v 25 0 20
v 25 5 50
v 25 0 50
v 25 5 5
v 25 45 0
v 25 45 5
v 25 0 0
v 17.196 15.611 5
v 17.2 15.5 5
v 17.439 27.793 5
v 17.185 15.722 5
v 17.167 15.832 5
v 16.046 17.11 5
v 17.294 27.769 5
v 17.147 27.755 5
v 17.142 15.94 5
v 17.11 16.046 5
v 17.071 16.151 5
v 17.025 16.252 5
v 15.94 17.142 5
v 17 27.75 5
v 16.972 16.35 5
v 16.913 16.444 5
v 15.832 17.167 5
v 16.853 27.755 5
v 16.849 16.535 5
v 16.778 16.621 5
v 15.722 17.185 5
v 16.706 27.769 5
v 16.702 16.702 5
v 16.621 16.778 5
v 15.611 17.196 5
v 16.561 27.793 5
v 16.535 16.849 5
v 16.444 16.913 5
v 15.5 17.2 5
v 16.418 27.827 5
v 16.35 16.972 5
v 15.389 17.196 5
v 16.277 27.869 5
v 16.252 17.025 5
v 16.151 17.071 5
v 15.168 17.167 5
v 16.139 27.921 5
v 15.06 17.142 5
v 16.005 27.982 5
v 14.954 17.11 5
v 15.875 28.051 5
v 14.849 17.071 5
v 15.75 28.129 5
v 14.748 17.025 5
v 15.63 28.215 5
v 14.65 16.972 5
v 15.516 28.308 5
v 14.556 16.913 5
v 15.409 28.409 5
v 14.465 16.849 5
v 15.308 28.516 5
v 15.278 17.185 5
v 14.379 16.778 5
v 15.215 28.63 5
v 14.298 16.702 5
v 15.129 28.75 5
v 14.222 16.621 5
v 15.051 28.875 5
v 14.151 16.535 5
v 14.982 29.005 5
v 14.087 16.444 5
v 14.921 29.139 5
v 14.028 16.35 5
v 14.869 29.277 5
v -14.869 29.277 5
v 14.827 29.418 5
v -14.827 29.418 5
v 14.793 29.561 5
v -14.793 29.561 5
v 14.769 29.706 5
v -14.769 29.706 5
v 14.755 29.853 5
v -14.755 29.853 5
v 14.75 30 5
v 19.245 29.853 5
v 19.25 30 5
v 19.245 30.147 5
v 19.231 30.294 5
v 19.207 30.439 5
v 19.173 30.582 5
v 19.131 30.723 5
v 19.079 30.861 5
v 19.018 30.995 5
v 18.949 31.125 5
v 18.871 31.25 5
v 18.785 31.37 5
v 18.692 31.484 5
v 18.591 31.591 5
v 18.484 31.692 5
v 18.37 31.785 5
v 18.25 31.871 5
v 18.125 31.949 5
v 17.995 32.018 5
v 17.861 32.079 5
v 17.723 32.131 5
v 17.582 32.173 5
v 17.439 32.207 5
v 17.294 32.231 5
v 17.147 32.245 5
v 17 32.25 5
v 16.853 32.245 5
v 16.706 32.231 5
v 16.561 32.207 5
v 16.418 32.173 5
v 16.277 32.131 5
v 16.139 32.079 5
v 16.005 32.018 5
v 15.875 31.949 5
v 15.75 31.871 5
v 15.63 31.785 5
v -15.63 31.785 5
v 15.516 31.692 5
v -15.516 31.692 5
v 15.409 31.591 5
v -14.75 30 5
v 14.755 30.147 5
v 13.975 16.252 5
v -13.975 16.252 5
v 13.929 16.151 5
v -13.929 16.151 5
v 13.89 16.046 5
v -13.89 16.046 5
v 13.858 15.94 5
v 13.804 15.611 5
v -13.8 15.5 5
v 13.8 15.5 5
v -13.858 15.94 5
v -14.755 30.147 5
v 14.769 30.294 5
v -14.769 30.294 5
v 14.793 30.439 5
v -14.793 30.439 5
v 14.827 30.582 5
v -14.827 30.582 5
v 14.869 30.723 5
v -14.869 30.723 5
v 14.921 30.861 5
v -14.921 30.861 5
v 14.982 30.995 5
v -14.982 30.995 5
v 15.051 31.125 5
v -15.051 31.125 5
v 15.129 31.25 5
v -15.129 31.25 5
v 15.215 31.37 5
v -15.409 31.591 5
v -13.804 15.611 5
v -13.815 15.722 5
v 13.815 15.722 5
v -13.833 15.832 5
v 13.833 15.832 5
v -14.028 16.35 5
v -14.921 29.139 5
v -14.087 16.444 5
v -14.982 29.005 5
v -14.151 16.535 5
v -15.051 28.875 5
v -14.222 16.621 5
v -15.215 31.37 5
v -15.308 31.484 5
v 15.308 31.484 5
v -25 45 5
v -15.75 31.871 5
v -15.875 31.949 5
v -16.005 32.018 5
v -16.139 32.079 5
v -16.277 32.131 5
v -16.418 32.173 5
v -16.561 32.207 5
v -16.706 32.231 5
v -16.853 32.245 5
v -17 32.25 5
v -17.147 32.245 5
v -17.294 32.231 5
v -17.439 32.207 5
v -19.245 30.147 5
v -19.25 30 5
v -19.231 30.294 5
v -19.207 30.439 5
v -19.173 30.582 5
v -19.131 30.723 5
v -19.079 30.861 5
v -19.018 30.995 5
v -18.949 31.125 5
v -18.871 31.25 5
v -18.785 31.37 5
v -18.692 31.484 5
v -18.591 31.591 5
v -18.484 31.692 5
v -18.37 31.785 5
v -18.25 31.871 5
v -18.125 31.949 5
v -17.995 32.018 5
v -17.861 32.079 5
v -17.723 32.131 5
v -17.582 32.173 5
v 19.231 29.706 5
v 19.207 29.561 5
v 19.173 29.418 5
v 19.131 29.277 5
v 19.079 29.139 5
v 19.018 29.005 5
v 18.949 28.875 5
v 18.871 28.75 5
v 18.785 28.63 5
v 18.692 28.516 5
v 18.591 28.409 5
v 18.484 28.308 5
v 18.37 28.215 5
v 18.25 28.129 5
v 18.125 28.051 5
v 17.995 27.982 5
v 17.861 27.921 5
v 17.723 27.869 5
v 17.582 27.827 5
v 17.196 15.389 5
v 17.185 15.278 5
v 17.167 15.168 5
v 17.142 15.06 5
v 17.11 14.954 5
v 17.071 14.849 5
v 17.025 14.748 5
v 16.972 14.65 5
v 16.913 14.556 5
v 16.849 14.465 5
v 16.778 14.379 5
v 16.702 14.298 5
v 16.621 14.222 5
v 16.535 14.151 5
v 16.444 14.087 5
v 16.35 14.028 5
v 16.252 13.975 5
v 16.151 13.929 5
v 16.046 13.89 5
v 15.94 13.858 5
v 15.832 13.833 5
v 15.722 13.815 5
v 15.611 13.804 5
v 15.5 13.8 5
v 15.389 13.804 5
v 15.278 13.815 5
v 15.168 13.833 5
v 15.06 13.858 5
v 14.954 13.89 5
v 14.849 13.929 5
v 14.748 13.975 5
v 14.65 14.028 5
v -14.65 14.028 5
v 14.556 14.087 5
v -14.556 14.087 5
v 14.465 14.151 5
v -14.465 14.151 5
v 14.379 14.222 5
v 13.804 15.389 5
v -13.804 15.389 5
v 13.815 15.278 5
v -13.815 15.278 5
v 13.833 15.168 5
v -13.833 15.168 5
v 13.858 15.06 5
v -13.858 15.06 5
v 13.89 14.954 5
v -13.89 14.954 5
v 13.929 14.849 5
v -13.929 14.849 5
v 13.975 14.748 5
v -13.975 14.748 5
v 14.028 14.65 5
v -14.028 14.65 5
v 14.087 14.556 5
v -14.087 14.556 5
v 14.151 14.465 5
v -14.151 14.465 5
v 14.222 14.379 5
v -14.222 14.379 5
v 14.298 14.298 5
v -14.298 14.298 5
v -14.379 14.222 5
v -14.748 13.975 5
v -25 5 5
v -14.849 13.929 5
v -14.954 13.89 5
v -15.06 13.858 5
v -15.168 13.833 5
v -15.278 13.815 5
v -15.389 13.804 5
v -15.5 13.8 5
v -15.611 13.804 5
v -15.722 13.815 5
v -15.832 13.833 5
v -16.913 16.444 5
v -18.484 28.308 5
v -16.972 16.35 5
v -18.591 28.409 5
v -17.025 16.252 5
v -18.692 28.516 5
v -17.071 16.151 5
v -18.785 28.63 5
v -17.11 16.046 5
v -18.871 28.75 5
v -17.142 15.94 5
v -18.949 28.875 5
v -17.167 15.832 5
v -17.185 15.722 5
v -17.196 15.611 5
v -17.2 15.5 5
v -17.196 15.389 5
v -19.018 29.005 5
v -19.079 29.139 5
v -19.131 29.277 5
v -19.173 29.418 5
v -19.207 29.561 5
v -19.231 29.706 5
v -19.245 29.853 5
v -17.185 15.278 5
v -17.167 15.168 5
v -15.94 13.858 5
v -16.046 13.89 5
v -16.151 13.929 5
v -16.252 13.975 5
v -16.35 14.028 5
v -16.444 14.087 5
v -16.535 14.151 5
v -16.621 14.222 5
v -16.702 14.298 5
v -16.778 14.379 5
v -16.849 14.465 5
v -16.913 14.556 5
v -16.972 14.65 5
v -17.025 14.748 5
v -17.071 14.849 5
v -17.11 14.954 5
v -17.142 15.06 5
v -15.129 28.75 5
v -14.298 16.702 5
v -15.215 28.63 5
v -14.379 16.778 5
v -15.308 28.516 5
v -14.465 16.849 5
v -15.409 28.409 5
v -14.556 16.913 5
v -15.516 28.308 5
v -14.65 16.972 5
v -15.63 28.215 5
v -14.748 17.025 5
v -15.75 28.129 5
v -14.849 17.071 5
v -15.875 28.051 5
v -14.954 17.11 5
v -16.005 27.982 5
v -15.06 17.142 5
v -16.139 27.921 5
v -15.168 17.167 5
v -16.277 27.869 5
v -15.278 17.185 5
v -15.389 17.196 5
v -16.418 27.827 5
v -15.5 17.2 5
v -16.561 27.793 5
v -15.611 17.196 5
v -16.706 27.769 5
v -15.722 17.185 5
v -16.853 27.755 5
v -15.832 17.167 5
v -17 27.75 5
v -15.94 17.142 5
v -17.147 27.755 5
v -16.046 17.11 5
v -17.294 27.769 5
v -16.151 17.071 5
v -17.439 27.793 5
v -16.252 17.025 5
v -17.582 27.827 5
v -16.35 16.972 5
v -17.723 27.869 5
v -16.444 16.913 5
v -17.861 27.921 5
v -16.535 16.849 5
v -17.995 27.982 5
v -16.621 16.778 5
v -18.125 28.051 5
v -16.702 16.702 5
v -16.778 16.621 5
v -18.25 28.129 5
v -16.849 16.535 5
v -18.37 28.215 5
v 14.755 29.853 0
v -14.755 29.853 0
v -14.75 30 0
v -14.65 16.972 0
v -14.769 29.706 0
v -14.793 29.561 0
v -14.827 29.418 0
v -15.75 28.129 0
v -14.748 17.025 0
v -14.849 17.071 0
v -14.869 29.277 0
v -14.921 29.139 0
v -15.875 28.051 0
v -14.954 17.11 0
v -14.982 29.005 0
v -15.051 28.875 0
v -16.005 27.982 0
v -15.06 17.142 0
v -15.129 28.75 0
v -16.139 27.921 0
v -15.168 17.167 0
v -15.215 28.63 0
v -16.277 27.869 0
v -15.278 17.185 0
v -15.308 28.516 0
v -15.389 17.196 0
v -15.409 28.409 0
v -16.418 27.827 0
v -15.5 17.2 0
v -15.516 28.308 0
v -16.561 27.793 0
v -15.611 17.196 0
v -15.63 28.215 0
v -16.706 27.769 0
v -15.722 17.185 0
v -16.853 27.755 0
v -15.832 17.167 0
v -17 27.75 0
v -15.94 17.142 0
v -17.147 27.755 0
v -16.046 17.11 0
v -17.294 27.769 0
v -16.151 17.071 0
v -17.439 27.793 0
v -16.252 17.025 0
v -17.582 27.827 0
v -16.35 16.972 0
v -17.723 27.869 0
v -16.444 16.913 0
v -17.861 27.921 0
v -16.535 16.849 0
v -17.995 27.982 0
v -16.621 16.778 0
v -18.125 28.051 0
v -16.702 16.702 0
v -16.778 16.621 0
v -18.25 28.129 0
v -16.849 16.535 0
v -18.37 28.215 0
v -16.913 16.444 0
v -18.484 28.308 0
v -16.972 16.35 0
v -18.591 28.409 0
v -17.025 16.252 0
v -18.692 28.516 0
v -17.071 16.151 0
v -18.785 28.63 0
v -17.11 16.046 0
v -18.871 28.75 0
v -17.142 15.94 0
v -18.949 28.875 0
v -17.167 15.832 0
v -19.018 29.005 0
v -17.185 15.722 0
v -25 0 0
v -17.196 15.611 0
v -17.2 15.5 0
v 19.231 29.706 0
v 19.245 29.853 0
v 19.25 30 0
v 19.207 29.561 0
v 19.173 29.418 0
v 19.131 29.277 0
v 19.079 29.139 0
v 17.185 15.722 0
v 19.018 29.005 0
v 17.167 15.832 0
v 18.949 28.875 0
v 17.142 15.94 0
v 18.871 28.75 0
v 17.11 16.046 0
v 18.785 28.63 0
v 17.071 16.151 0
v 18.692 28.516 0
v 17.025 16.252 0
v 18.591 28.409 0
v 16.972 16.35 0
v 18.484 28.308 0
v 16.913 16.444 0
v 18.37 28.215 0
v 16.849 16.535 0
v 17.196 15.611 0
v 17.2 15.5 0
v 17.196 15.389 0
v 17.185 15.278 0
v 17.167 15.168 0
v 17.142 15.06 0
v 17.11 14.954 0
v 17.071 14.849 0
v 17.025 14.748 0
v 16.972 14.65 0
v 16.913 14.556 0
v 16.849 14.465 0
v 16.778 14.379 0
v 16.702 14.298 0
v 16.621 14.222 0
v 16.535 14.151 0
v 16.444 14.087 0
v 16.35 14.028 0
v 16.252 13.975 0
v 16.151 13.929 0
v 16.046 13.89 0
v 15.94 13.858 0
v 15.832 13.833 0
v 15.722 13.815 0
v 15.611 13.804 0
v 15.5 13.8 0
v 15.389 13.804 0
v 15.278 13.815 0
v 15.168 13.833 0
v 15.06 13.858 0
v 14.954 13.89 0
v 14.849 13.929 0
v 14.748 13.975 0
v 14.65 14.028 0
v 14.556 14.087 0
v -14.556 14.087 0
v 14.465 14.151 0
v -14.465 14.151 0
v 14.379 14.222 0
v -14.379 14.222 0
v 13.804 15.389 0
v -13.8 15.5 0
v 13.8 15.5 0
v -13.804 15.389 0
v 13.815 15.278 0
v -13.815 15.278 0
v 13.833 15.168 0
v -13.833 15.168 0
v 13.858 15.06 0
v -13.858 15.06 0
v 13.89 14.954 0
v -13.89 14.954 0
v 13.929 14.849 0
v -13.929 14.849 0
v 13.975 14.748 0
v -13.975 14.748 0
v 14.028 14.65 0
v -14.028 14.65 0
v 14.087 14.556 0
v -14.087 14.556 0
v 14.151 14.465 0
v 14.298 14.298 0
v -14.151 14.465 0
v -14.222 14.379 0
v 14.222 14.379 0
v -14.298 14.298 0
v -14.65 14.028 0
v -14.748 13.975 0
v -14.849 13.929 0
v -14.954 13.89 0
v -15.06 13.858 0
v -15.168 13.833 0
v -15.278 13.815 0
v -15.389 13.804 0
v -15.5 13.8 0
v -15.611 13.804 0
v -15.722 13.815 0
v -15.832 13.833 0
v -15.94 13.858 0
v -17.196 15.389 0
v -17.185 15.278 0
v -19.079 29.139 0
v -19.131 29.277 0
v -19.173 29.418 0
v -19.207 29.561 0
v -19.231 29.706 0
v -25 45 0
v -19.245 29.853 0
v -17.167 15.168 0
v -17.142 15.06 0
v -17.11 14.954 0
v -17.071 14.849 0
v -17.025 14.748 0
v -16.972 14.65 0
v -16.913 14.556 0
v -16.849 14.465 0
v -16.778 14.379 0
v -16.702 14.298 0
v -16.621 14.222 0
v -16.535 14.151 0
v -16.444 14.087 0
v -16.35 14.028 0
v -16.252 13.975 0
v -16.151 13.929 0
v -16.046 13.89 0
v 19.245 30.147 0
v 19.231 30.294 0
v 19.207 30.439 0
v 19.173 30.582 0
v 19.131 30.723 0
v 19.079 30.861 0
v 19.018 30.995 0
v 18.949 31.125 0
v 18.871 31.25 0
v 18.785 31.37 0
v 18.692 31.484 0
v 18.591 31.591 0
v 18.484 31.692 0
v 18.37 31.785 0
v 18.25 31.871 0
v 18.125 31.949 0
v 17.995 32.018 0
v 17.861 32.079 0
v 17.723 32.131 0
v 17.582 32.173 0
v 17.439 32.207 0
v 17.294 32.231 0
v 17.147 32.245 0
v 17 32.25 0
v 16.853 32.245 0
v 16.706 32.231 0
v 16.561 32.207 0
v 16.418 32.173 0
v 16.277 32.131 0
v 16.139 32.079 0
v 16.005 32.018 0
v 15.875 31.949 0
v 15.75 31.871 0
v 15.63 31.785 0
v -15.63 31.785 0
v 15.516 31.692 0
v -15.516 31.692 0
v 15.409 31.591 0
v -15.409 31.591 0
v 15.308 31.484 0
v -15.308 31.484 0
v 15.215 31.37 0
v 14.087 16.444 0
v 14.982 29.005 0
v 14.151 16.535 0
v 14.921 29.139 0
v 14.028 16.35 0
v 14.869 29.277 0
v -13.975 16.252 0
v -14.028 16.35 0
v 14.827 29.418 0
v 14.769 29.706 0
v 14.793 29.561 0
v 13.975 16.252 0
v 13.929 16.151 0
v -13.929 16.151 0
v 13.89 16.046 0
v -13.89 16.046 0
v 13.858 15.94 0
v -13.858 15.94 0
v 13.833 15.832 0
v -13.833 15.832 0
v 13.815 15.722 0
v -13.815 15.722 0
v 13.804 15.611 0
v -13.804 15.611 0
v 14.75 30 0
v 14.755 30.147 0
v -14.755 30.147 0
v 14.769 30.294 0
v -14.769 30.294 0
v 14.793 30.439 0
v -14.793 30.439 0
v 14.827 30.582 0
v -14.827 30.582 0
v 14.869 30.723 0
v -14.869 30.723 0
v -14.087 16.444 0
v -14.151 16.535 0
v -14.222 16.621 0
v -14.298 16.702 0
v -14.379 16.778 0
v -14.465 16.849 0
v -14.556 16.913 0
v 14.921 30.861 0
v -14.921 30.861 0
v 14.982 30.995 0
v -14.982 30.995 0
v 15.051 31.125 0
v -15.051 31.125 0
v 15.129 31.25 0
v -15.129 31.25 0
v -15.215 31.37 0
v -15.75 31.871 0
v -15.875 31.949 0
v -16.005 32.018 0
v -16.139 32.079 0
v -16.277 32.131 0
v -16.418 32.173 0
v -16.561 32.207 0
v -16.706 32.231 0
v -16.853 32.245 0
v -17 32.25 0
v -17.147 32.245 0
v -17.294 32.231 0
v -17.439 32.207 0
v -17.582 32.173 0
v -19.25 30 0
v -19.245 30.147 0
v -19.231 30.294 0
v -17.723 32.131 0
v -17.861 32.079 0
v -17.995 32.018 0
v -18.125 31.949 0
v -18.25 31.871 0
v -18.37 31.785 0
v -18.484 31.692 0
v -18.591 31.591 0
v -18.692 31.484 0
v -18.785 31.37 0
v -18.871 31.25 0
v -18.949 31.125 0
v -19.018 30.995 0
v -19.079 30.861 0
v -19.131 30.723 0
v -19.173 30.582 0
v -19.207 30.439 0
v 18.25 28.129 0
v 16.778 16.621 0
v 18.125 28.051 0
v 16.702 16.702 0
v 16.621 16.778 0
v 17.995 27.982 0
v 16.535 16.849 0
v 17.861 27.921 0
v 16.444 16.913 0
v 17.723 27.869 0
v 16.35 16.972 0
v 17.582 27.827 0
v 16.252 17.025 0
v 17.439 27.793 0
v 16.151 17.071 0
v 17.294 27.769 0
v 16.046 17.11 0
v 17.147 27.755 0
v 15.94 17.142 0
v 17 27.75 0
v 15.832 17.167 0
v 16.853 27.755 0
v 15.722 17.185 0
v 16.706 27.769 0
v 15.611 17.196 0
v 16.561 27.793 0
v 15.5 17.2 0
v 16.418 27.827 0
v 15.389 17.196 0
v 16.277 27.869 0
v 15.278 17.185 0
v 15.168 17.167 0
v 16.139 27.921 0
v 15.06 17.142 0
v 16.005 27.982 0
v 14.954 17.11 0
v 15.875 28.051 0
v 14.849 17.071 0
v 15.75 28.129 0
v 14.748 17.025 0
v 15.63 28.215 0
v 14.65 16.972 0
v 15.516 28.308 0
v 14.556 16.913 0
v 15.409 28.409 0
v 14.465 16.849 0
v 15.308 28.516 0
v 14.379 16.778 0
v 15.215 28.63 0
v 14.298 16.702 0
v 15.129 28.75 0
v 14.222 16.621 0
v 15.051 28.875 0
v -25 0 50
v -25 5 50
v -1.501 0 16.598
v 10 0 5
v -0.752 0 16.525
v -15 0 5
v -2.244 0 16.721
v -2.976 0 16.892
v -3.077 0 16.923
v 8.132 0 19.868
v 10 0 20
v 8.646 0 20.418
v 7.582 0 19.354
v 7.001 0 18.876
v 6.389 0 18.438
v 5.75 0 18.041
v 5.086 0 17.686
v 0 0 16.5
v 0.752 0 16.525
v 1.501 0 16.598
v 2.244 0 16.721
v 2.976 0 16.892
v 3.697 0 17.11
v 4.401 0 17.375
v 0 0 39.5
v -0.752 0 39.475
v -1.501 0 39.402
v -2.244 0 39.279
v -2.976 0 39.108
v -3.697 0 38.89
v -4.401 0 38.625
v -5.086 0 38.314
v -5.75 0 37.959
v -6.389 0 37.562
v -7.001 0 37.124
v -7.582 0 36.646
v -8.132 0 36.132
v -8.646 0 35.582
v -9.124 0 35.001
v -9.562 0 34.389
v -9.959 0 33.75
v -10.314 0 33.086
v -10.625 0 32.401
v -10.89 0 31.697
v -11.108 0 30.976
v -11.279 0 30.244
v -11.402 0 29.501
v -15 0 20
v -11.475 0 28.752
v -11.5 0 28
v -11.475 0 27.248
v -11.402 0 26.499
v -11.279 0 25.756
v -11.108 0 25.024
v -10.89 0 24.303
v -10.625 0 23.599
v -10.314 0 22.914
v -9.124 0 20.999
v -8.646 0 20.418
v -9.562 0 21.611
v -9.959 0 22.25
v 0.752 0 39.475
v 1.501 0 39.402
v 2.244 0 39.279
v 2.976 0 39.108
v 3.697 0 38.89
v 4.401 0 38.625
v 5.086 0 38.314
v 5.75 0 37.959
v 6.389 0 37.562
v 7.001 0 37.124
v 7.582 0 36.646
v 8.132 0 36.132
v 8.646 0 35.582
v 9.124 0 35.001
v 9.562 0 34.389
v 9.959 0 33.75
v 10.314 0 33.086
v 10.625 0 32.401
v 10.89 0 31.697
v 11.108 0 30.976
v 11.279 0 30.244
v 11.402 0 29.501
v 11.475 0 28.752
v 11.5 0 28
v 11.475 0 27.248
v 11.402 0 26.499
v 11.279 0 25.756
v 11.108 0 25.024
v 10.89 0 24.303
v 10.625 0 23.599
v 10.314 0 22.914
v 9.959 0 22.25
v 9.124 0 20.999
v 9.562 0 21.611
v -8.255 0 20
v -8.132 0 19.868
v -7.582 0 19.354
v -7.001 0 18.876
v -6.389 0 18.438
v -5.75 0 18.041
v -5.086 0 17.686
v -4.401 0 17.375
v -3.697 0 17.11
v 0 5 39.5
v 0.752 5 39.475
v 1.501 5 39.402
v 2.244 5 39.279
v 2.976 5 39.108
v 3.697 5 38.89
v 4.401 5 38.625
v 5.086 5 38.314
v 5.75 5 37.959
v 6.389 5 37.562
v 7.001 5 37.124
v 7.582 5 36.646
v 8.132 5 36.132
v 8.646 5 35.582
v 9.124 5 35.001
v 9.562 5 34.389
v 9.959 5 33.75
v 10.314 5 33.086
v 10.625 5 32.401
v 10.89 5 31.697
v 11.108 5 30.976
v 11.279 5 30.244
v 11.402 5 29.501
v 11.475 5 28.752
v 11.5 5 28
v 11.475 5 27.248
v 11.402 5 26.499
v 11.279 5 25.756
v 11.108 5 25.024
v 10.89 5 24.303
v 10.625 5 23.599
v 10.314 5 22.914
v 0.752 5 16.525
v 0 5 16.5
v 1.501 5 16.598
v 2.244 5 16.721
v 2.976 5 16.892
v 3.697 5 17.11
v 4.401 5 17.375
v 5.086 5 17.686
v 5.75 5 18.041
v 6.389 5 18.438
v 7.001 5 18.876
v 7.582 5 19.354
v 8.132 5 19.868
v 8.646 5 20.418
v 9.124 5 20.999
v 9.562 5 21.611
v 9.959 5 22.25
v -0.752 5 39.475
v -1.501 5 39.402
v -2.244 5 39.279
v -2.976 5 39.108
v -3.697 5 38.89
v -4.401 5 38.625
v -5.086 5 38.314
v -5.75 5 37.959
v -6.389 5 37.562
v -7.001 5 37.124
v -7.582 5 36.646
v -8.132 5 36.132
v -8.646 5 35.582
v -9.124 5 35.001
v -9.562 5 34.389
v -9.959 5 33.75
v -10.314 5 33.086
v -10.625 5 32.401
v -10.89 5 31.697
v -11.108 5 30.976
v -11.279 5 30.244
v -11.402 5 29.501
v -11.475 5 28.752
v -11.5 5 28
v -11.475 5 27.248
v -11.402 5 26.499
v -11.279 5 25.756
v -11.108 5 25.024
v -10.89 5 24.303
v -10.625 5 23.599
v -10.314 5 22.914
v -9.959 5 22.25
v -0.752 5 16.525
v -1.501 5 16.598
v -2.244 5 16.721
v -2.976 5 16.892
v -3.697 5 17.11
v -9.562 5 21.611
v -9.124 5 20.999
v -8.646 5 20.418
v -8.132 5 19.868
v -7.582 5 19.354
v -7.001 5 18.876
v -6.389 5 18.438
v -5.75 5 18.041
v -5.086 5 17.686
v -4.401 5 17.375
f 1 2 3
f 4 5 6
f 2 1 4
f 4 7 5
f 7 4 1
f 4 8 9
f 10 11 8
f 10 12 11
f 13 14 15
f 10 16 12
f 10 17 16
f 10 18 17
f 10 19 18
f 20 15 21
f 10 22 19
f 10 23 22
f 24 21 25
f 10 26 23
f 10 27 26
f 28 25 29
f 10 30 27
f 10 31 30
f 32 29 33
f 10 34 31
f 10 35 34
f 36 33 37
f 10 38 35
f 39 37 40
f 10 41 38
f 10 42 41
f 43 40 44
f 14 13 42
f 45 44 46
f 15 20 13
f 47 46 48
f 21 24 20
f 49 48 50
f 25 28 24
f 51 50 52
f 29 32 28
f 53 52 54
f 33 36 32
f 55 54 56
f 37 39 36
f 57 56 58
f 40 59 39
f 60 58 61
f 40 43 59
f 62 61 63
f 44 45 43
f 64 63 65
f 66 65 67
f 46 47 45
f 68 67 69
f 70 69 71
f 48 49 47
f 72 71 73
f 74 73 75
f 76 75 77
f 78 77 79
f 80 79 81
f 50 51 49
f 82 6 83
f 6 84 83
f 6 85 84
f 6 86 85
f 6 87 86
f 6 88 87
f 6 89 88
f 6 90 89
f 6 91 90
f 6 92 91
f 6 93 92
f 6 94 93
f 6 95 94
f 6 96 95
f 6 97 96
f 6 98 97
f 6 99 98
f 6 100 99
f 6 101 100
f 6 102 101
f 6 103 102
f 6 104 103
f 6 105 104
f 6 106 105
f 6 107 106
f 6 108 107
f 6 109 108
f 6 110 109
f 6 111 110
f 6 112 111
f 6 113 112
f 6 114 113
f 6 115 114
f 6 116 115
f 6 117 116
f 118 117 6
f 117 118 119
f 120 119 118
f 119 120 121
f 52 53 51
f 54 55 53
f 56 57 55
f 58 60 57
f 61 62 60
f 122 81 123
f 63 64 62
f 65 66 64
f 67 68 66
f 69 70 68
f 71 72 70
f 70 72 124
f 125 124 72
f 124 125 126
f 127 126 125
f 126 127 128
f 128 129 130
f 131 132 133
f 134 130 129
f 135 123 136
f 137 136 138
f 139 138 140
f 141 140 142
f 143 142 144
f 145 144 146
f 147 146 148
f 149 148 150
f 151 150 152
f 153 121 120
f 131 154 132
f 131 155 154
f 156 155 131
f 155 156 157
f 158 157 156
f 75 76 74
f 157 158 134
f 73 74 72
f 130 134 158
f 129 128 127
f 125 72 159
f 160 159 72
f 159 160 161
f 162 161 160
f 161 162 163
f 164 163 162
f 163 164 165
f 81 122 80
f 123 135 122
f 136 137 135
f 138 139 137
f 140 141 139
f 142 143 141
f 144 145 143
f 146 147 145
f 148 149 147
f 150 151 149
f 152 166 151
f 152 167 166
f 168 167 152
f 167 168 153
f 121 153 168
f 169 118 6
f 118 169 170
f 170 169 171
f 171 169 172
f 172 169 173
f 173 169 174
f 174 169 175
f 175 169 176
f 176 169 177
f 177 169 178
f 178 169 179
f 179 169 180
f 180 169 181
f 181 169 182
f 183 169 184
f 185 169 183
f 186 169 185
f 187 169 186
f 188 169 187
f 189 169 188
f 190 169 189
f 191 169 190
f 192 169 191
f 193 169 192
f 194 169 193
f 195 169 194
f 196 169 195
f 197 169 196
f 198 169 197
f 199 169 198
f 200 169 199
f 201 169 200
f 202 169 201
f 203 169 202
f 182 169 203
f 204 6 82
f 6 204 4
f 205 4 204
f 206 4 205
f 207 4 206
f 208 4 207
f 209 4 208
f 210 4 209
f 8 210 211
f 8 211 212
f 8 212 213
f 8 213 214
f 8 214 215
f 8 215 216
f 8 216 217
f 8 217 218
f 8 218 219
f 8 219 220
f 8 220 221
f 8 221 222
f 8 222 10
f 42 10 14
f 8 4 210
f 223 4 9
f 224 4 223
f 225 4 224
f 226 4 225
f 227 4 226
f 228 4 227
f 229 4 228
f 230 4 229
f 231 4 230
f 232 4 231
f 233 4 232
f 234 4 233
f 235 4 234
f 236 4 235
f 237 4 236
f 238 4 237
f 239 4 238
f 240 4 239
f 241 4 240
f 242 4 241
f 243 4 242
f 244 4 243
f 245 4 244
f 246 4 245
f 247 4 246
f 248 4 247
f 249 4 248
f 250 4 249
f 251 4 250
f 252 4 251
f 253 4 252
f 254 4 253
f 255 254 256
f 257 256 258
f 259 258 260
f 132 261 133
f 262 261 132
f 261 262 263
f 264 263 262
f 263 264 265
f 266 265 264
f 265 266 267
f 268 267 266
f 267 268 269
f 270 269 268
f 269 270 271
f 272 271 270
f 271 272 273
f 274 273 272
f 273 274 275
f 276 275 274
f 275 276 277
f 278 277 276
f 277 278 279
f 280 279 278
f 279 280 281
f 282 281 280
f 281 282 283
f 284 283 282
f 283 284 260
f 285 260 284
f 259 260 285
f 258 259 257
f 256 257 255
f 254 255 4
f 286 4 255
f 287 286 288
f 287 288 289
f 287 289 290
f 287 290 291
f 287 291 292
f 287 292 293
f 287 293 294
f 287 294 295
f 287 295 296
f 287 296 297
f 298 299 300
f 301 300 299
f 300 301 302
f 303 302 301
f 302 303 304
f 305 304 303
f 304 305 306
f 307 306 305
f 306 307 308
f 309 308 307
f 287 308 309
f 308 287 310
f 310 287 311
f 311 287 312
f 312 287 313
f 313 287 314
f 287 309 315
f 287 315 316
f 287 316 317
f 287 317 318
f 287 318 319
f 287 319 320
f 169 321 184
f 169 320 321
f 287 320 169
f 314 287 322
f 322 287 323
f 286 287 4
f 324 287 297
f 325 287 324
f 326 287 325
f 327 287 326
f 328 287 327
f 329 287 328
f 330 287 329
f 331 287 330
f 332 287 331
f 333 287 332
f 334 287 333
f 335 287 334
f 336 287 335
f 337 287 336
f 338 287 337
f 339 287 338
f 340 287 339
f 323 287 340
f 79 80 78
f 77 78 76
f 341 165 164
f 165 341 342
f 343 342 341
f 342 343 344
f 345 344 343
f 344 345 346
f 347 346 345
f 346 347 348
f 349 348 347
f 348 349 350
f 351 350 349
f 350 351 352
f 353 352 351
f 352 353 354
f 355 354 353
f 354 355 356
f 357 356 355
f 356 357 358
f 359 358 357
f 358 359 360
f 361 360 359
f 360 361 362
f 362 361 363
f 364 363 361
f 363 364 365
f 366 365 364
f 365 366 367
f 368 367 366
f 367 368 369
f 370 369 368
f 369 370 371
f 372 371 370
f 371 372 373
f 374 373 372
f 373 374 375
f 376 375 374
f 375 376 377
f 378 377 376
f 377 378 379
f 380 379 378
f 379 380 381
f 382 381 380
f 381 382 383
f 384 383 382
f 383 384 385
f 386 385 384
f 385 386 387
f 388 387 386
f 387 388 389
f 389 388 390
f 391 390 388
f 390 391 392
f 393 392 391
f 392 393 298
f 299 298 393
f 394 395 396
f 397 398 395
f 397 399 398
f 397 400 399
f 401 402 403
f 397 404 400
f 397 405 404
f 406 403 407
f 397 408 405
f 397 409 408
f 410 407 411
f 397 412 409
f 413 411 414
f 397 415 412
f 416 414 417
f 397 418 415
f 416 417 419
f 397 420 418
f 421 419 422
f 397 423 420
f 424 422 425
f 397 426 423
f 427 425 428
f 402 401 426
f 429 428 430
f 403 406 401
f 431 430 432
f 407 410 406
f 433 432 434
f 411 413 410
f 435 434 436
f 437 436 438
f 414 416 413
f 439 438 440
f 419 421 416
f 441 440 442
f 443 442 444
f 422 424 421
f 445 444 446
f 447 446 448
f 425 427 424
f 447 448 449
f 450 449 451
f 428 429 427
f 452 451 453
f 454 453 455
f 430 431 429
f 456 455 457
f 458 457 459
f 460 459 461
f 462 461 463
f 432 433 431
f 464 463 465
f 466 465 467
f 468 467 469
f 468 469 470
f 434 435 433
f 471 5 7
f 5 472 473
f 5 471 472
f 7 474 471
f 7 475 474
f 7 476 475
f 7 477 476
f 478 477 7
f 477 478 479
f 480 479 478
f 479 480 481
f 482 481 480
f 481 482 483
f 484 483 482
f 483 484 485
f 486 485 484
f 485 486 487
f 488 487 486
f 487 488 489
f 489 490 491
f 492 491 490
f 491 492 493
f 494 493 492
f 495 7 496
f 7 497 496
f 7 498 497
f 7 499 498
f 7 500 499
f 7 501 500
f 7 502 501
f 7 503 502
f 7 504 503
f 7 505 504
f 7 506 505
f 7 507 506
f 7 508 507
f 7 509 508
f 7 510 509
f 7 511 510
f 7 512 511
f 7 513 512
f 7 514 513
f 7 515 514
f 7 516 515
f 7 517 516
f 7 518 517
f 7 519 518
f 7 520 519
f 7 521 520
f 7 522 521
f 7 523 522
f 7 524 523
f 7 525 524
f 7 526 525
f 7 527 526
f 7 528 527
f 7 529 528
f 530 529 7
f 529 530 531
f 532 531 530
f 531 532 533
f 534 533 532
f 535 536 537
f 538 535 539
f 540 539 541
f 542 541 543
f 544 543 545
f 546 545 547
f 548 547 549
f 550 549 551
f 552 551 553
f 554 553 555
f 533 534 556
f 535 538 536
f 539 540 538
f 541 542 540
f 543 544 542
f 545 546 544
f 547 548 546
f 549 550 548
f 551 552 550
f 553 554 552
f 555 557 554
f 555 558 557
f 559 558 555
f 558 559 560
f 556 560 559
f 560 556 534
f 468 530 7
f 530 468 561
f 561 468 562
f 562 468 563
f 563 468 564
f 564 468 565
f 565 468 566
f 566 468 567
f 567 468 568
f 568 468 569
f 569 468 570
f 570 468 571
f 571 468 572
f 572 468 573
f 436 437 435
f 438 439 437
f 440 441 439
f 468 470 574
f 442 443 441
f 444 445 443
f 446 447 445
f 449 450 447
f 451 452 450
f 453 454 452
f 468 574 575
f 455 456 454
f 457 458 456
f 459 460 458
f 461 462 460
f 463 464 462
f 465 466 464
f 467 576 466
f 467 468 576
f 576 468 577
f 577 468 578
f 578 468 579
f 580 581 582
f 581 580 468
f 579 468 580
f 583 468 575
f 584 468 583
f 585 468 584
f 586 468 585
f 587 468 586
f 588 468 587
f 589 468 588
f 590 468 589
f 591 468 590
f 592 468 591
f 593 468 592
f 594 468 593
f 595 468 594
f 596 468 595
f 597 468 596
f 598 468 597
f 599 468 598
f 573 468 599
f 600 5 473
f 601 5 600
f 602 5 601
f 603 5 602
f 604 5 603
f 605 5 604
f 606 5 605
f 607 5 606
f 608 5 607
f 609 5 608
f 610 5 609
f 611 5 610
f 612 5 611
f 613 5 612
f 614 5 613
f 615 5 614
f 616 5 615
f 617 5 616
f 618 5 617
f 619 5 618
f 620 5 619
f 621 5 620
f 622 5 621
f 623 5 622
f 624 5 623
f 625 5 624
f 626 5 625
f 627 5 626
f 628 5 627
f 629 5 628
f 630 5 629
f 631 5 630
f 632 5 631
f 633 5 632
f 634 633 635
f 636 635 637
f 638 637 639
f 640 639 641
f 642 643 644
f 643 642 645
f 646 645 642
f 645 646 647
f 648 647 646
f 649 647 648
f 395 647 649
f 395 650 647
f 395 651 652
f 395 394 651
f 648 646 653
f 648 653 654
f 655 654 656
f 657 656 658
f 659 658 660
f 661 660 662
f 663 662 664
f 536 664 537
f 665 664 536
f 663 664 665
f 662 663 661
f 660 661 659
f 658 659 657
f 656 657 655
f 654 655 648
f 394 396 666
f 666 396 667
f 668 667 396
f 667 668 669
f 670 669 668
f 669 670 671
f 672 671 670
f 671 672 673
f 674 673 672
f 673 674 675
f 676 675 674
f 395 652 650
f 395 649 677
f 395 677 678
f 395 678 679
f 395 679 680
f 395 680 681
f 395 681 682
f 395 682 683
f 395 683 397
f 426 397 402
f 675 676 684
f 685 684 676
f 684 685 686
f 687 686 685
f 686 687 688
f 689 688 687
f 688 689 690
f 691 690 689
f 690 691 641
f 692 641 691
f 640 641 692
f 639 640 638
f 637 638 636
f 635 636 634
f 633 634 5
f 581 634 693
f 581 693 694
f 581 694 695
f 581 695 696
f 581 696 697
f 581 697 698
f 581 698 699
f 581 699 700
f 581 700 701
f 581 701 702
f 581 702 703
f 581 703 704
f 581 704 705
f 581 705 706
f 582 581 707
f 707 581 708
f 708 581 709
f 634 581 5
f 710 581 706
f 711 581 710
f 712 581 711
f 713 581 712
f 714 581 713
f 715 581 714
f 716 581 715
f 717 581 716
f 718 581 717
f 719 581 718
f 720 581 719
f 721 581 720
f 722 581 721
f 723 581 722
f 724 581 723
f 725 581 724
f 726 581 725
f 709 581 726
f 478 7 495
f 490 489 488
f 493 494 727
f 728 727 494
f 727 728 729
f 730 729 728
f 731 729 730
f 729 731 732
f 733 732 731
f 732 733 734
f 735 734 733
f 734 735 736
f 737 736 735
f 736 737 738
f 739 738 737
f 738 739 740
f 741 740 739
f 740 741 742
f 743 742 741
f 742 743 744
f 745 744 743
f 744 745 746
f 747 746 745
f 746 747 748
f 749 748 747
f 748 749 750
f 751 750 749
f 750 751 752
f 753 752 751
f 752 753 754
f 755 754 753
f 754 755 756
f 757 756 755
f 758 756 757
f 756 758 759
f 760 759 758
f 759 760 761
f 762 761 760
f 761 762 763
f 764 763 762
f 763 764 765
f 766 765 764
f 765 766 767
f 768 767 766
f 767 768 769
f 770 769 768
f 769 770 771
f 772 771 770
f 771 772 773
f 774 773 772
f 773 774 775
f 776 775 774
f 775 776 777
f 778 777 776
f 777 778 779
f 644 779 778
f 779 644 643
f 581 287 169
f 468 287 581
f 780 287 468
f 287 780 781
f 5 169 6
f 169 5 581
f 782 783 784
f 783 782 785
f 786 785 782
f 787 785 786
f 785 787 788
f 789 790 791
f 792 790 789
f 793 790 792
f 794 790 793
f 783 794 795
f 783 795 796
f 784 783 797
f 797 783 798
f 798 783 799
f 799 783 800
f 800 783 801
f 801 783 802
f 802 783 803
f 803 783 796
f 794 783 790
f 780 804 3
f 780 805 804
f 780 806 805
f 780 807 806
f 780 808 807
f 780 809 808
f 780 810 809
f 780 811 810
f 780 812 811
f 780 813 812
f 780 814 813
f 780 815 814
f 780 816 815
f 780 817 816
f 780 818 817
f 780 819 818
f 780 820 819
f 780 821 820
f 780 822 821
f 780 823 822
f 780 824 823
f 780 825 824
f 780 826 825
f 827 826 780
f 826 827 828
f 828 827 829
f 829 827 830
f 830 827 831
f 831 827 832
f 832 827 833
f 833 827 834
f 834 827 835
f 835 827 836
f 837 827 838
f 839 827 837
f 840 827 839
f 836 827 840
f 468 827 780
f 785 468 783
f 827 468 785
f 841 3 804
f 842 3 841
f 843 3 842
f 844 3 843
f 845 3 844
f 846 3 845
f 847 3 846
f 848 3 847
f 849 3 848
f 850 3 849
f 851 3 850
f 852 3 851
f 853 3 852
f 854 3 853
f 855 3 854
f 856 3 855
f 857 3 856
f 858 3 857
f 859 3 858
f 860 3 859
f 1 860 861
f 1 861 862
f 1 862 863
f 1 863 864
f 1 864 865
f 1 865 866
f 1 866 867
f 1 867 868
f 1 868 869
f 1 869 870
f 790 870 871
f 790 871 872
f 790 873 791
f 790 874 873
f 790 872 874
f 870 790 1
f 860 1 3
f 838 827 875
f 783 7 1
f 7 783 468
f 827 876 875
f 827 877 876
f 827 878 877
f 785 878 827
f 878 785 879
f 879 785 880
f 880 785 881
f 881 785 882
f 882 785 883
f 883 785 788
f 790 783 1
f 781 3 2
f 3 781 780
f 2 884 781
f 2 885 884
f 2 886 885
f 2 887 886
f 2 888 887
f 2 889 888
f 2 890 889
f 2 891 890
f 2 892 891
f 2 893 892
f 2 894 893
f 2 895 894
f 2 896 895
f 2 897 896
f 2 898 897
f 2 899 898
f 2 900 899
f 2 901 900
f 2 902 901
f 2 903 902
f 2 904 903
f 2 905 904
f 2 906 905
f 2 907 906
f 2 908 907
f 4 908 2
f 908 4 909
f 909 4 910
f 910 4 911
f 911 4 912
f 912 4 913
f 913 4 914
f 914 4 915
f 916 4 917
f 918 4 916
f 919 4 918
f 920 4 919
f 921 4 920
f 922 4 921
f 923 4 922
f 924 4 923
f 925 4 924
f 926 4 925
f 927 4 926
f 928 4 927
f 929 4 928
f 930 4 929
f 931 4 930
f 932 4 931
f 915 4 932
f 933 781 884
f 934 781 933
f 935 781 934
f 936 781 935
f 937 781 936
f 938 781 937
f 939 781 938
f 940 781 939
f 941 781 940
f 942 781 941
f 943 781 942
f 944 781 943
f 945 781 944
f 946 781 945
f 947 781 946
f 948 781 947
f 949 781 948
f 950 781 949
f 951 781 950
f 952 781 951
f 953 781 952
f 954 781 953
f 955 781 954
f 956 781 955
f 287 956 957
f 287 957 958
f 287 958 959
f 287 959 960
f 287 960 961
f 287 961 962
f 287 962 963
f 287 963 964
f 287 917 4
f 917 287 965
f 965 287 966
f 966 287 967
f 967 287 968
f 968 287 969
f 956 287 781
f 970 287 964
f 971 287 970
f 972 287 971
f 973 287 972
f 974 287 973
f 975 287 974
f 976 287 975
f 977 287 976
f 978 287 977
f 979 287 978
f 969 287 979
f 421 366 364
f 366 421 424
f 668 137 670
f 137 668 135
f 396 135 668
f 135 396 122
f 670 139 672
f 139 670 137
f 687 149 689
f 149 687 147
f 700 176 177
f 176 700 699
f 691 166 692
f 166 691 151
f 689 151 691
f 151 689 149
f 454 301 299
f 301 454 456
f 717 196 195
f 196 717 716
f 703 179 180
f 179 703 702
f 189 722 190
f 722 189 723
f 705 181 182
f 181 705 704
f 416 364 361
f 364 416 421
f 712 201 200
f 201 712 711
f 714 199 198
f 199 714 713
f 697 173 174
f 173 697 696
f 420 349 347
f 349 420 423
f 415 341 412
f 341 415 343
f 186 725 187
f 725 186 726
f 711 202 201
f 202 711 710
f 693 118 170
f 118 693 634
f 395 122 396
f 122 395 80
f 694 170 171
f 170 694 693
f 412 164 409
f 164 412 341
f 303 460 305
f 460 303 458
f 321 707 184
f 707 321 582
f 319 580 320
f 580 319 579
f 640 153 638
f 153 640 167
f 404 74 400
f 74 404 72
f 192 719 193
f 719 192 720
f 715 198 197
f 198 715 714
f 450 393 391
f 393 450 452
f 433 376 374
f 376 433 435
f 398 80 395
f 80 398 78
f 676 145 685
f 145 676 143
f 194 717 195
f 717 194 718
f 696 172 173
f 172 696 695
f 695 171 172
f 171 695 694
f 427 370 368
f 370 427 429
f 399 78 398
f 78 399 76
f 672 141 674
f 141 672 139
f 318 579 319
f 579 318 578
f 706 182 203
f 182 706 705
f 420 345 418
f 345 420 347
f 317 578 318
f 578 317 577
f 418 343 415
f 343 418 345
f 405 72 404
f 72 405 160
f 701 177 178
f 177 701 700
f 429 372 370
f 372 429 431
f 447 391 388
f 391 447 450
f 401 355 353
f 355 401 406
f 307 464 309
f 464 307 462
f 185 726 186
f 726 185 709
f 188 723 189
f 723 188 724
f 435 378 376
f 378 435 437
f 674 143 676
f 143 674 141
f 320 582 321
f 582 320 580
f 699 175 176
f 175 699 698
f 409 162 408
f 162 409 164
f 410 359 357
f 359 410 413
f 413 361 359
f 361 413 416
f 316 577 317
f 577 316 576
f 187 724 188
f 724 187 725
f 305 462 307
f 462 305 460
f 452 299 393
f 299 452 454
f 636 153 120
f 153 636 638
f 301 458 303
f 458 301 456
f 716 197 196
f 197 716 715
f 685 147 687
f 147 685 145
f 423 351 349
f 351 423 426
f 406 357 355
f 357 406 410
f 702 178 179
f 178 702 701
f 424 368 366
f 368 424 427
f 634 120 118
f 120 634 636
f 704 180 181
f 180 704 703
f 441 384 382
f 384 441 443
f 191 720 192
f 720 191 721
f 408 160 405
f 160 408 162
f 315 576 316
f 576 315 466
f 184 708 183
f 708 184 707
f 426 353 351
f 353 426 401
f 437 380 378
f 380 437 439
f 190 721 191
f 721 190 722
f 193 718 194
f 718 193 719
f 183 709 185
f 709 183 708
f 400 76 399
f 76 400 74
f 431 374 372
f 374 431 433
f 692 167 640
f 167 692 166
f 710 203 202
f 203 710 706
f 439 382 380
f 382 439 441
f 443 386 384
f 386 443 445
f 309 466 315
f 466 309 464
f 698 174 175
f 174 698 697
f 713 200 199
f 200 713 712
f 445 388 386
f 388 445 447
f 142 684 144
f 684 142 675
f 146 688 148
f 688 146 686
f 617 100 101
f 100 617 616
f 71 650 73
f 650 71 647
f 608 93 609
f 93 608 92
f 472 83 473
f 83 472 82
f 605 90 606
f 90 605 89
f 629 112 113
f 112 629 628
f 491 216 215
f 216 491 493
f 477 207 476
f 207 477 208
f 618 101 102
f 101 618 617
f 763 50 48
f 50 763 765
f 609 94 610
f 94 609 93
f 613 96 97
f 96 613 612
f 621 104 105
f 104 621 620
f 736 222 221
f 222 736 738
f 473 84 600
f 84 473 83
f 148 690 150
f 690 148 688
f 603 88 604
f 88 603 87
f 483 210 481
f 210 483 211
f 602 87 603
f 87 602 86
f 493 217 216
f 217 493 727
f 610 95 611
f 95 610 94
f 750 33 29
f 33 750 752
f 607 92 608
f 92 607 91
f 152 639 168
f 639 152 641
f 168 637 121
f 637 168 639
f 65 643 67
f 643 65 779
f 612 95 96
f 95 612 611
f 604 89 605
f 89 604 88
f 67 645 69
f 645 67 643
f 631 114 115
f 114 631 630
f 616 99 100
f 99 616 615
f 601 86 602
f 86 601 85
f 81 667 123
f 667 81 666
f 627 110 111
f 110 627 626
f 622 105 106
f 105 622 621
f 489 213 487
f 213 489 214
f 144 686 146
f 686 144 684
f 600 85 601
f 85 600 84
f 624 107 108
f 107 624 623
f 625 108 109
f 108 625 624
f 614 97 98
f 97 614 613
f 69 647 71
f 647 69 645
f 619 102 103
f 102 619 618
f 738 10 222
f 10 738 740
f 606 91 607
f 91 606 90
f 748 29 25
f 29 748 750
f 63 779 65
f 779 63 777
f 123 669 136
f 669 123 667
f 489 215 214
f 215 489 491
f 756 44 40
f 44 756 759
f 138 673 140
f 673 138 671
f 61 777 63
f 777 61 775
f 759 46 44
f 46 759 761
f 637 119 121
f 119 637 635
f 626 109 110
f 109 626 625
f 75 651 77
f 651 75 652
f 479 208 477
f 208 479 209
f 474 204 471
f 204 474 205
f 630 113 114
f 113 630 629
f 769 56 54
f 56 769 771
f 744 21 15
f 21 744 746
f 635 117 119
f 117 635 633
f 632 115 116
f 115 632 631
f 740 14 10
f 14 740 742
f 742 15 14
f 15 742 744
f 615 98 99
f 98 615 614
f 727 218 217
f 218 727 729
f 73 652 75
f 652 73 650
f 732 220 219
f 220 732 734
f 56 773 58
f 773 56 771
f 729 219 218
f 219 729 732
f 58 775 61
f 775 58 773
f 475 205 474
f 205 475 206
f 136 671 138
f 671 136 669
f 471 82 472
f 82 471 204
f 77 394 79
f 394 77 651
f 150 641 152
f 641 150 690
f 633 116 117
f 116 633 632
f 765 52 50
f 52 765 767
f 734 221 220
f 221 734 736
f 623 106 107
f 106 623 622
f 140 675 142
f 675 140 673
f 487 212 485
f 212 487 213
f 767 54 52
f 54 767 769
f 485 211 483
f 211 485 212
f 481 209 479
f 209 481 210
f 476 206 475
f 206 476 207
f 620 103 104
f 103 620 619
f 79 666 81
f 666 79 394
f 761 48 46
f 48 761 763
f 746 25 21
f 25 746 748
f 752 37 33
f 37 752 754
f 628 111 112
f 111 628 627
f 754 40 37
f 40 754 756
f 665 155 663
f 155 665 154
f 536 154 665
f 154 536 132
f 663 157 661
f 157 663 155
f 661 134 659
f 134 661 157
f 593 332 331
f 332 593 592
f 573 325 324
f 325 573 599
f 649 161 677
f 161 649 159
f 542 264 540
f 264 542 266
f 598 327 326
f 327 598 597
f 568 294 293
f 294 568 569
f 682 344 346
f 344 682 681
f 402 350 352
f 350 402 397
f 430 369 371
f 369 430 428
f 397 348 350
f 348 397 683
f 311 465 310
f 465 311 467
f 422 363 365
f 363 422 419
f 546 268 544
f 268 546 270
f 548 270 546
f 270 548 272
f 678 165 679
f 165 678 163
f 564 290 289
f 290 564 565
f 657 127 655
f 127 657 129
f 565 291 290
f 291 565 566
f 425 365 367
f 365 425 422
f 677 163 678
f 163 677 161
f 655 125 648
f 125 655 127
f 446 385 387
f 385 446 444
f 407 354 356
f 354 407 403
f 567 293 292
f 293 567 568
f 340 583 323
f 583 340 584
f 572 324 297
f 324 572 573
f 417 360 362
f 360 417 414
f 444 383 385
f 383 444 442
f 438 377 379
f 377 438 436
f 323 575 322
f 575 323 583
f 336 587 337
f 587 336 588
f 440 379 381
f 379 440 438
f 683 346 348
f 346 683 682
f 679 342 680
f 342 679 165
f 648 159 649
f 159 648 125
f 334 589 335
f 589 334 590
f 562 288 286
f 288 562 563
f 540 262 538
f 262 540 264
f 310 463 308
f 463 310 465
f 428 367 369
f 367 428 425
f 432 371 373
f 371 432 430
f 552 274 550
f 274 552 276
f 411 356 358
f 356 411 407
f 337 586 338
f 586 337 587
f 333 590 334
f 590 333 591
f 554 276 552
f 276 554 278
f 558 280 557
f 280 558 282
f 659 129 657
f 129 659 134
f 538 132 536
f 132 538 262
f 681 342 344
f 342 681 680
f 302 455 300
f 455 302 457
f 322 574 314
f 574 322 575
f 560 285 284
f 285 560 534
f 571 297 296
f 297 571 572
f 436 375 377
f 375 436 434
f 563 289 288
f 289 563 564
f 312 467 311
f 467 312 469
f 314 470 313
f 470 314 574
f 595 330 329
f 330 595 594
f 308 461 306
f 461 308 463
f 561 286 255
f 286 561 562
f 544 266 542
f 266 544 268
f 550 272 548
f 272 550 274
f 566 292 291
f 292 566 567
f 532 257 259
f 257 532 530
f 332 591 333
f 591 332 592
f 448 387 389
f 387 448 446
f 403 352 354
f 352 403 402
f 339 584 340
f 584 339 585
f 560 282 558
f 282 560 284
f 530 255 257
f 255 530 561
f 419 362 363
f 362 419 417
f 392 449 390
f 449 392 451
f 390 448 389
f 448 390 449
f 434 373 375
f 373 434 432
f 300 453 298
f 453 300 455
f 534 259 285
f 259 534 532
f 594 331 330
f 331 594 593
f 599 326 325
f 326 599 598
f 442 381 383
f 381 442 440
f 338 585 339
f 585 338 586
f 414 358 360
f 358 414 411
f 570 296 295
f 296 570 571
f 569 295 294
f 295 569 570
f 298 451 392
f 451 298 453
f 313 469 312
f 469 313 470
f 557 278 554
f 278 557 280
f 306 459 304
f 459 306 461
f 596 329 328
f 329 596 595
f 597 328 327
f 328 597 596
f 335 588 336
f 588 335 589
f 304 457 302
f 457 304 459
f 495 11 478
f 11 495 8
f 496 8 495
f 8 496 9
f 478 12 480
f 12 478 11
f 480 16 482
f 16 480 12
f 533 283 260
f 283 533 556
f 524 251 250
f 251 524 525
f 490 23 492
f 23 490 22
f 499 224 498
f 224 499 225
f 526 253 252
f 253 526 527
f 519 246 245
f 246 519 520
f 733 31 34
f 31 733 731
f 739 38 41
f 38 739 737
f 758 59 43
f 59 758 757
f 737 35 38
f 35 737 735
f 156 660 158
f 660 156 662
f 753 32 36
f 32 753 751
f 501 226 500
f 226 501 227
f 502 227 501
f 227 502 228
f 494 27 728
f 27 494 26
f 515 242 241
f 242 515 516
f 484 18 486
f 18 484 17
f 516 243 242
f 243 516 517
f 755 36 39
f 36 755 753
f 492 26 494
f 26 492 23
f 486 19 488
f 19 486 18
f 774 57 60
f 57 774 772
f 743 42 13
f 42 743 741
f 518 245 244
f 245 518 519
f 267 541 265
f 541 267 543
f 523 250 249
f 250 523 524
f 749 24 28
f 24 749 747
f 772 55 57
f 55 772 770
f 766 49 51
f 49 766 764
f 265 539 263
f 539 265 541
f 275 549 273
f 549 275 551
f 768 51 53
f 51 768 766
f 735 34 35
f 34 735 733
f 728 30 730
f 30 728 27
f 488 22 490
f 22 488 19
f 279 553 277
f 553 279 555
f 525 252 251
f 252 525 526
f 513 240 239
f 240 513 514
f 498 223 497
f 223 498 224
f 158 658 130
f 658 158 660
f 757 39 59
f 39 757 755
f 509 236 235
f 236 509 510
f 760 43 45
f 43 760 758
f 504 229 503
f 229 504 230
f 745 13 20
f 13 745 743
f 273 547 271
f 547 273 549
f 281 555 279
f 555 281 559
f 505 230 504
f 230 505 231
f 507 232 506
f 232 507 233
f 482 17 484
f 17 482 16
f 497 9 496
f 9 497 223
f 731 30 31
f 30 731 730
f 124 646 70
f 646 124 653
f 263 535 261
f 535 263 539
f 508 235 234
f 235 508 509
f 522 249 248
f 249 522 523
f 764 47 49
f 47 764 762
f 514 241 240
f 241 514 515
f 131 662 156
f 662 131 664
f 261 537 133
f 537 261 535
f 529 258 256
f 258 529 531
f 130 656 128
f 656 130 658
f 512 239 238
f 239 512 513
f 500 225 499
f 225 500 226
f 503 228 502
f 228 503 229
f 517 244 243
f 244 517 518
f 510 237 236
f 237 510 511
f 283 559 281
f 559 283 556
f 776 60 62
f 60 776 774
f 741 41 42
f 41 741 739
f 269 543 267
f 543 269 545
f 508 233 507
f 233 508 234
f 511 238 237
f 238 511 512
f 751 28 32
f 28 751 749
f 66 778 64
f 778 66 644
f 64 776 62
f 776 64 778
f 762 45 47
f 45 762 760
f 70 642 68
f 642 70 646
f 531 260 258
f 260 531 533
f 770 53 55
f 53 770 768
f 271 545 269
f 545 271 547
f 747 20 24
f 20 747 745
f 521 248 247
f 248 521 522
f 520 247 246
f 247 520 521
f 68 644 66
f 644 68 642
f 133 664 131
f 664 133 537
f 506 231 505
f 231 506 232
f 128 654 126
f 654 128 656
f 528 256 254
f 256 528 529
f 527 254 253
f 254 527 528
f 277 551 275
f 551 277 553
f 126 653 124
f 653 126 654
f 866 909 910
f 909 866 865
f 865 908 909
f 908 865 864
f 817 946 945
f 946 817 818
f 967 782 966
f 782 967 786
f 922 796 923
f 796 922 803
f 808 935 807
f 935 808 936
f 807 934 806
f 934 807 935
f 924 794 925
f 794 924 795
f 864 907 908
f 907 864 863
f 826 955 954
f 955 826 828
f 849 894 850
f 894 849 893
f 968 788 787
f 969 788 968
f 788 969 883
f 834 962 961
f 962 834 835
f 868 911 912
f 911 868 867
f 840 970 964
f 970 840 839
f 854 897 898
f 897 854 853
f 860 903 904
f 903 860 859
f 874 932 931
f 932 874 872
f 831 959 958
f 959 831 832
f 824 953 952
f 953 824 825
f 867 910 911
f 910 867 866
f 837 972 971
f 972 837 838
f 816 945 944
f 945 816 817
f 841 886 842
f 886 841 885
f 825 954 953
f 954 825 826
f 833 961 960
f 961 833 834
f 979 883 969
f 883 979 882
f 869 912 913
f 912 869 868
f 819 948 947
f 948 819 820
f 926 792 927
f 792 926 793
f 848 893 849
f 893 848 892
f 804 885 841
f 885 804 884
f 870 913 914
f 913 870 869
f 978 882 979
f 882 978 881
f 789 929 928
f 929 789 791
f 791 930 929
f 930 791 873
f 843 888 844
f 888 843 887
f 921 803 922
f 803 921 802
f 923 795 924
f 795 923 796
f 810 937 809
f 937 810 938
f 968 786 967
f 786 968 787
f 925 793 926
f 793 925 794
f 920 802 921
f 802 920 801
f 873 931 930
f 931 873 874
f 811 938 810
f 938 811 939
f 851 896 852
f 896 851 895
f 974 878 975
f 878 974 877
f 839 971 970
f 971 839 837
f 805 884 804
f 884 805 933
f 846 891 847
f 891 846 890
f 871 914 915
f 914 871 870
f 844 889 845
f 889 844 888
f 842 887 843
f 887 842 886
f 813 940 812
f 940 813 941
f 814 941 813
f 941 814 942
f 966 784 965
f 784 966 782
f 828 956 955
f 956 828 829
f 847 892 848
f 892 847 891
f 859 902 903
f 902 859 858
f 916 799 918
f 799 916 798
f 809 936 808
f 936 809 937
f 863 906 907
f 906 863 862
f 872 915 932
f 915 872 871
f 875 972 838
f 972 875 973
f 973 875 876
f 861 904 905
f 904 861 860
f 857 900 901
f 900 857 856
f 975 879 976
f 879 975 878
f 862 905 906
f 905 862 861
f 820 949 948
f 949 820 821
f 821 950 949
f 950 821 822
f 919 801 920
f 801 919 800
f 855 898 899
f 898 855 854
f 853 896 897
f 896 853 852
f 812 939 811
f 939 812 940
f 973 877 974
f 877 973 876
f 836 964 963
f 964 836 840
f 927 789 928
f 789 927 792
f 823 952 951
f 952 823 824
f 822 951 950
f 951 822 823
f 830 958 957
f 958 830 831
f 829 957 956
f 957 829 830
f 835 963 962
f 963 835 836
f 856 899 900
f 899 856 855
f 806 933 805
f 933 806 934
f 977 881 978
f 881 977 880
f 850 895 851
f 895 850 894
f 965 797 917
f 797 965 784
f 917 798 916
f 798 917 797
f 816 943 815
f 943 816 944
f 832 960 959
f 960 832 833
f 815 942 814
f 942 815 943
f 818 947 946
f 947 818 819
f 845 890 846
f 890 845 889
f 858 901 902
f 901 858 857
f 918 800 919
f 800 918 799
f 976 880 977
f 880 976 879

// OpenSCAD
// L-shaped mounting bracket for a NEMA 17 stepper motor
// Print orientation: base plate on the bed (z = 0), vertical plate builds upward.

// ---------------- Parameters ----------------
plate_x       = 25;    // base plate half-length in X (mm)
plate_y       = 45;    // base plate length in Y (mm)
plate_t       = 5;     // base plate thickness (mm)

motor_h       = 50;    // vertical motor plate height (mm)
motor_w       = 25;    // vertical motor plate half-width in X (mm)

boss_d        = 23;    // diameter of the motor centring-boss hole (mm)
boss_x        = 0;     // boss hole centre X (mm)
boss_z        = 28;    // boss hole centre Z (mm)

screw_d       = 3.4;   // M3 screw hole diameter (mm)
screw_pattern = 31;    // square pitch of the four screw holes (mm)

gusset_t      = 5;     // gusset thickness along X (mm)
gusset_y      = 20;    // gusset leg length along +Y (mm)
gusset_z      = 20;    // gusset leg length along +Z (mm)

eps           = 0.5;   // cutter overshoot past faces (mm)
$fn           = 96;    // curve resolution

// ---------------- Model ----------------
difference() {
    union() {
        // Base plate
        translate([-plate_x, 0, 0])
            cube([plate_x * 2, plate_y, plate_t]);

        // Vertical motor plate, standing on the back edge of the base
        translate([-motor_w, 0, 0])
            cube([motor_w * 2, plate_t, motor_h]);
    }

    // Two vertical through-holes in the base plate (M4)
    for (h = [-1, 1])
        translate([h * 17, 30, -eps])
            cylinder(d = 4.5, h = plate_t + 2 * eps);

    // Motor boss hole, axis along Y, centre at x = 0, z = 28
    translate([boss_x, -eps, boss_z])
        rotate([-90, 0, 0])
            cylinder(d = boss_d, h = plate_t + 2 * eps);

    // Four M3 screw holes on a square pattern centred on the boss hole
    for (a = [-1, -1, 1, 1])
        for (b = [-1, 1])
            translate([a * screw_pattern / 2, b * screw_pattern / 2, -eps])
                cylinder(d = screw_d, h = plate_t + 2 * eps);

    // Triangular gussets, flush with the left and right edges
    for (sx = [-1, 1])
        translate([sx * (plate_x - (sx < 0 ? gusset_t : plate_x - gusset_t)), 0, 0])
            rotate([90, 0, 0])
                linear_extrude(height = gusset_t)
                    polygon(points = [
                        [plate_t, plate_t],
                        [plate_t, gusset_y],
                        [gusset_z, gusset_y]
                    ]);
}
